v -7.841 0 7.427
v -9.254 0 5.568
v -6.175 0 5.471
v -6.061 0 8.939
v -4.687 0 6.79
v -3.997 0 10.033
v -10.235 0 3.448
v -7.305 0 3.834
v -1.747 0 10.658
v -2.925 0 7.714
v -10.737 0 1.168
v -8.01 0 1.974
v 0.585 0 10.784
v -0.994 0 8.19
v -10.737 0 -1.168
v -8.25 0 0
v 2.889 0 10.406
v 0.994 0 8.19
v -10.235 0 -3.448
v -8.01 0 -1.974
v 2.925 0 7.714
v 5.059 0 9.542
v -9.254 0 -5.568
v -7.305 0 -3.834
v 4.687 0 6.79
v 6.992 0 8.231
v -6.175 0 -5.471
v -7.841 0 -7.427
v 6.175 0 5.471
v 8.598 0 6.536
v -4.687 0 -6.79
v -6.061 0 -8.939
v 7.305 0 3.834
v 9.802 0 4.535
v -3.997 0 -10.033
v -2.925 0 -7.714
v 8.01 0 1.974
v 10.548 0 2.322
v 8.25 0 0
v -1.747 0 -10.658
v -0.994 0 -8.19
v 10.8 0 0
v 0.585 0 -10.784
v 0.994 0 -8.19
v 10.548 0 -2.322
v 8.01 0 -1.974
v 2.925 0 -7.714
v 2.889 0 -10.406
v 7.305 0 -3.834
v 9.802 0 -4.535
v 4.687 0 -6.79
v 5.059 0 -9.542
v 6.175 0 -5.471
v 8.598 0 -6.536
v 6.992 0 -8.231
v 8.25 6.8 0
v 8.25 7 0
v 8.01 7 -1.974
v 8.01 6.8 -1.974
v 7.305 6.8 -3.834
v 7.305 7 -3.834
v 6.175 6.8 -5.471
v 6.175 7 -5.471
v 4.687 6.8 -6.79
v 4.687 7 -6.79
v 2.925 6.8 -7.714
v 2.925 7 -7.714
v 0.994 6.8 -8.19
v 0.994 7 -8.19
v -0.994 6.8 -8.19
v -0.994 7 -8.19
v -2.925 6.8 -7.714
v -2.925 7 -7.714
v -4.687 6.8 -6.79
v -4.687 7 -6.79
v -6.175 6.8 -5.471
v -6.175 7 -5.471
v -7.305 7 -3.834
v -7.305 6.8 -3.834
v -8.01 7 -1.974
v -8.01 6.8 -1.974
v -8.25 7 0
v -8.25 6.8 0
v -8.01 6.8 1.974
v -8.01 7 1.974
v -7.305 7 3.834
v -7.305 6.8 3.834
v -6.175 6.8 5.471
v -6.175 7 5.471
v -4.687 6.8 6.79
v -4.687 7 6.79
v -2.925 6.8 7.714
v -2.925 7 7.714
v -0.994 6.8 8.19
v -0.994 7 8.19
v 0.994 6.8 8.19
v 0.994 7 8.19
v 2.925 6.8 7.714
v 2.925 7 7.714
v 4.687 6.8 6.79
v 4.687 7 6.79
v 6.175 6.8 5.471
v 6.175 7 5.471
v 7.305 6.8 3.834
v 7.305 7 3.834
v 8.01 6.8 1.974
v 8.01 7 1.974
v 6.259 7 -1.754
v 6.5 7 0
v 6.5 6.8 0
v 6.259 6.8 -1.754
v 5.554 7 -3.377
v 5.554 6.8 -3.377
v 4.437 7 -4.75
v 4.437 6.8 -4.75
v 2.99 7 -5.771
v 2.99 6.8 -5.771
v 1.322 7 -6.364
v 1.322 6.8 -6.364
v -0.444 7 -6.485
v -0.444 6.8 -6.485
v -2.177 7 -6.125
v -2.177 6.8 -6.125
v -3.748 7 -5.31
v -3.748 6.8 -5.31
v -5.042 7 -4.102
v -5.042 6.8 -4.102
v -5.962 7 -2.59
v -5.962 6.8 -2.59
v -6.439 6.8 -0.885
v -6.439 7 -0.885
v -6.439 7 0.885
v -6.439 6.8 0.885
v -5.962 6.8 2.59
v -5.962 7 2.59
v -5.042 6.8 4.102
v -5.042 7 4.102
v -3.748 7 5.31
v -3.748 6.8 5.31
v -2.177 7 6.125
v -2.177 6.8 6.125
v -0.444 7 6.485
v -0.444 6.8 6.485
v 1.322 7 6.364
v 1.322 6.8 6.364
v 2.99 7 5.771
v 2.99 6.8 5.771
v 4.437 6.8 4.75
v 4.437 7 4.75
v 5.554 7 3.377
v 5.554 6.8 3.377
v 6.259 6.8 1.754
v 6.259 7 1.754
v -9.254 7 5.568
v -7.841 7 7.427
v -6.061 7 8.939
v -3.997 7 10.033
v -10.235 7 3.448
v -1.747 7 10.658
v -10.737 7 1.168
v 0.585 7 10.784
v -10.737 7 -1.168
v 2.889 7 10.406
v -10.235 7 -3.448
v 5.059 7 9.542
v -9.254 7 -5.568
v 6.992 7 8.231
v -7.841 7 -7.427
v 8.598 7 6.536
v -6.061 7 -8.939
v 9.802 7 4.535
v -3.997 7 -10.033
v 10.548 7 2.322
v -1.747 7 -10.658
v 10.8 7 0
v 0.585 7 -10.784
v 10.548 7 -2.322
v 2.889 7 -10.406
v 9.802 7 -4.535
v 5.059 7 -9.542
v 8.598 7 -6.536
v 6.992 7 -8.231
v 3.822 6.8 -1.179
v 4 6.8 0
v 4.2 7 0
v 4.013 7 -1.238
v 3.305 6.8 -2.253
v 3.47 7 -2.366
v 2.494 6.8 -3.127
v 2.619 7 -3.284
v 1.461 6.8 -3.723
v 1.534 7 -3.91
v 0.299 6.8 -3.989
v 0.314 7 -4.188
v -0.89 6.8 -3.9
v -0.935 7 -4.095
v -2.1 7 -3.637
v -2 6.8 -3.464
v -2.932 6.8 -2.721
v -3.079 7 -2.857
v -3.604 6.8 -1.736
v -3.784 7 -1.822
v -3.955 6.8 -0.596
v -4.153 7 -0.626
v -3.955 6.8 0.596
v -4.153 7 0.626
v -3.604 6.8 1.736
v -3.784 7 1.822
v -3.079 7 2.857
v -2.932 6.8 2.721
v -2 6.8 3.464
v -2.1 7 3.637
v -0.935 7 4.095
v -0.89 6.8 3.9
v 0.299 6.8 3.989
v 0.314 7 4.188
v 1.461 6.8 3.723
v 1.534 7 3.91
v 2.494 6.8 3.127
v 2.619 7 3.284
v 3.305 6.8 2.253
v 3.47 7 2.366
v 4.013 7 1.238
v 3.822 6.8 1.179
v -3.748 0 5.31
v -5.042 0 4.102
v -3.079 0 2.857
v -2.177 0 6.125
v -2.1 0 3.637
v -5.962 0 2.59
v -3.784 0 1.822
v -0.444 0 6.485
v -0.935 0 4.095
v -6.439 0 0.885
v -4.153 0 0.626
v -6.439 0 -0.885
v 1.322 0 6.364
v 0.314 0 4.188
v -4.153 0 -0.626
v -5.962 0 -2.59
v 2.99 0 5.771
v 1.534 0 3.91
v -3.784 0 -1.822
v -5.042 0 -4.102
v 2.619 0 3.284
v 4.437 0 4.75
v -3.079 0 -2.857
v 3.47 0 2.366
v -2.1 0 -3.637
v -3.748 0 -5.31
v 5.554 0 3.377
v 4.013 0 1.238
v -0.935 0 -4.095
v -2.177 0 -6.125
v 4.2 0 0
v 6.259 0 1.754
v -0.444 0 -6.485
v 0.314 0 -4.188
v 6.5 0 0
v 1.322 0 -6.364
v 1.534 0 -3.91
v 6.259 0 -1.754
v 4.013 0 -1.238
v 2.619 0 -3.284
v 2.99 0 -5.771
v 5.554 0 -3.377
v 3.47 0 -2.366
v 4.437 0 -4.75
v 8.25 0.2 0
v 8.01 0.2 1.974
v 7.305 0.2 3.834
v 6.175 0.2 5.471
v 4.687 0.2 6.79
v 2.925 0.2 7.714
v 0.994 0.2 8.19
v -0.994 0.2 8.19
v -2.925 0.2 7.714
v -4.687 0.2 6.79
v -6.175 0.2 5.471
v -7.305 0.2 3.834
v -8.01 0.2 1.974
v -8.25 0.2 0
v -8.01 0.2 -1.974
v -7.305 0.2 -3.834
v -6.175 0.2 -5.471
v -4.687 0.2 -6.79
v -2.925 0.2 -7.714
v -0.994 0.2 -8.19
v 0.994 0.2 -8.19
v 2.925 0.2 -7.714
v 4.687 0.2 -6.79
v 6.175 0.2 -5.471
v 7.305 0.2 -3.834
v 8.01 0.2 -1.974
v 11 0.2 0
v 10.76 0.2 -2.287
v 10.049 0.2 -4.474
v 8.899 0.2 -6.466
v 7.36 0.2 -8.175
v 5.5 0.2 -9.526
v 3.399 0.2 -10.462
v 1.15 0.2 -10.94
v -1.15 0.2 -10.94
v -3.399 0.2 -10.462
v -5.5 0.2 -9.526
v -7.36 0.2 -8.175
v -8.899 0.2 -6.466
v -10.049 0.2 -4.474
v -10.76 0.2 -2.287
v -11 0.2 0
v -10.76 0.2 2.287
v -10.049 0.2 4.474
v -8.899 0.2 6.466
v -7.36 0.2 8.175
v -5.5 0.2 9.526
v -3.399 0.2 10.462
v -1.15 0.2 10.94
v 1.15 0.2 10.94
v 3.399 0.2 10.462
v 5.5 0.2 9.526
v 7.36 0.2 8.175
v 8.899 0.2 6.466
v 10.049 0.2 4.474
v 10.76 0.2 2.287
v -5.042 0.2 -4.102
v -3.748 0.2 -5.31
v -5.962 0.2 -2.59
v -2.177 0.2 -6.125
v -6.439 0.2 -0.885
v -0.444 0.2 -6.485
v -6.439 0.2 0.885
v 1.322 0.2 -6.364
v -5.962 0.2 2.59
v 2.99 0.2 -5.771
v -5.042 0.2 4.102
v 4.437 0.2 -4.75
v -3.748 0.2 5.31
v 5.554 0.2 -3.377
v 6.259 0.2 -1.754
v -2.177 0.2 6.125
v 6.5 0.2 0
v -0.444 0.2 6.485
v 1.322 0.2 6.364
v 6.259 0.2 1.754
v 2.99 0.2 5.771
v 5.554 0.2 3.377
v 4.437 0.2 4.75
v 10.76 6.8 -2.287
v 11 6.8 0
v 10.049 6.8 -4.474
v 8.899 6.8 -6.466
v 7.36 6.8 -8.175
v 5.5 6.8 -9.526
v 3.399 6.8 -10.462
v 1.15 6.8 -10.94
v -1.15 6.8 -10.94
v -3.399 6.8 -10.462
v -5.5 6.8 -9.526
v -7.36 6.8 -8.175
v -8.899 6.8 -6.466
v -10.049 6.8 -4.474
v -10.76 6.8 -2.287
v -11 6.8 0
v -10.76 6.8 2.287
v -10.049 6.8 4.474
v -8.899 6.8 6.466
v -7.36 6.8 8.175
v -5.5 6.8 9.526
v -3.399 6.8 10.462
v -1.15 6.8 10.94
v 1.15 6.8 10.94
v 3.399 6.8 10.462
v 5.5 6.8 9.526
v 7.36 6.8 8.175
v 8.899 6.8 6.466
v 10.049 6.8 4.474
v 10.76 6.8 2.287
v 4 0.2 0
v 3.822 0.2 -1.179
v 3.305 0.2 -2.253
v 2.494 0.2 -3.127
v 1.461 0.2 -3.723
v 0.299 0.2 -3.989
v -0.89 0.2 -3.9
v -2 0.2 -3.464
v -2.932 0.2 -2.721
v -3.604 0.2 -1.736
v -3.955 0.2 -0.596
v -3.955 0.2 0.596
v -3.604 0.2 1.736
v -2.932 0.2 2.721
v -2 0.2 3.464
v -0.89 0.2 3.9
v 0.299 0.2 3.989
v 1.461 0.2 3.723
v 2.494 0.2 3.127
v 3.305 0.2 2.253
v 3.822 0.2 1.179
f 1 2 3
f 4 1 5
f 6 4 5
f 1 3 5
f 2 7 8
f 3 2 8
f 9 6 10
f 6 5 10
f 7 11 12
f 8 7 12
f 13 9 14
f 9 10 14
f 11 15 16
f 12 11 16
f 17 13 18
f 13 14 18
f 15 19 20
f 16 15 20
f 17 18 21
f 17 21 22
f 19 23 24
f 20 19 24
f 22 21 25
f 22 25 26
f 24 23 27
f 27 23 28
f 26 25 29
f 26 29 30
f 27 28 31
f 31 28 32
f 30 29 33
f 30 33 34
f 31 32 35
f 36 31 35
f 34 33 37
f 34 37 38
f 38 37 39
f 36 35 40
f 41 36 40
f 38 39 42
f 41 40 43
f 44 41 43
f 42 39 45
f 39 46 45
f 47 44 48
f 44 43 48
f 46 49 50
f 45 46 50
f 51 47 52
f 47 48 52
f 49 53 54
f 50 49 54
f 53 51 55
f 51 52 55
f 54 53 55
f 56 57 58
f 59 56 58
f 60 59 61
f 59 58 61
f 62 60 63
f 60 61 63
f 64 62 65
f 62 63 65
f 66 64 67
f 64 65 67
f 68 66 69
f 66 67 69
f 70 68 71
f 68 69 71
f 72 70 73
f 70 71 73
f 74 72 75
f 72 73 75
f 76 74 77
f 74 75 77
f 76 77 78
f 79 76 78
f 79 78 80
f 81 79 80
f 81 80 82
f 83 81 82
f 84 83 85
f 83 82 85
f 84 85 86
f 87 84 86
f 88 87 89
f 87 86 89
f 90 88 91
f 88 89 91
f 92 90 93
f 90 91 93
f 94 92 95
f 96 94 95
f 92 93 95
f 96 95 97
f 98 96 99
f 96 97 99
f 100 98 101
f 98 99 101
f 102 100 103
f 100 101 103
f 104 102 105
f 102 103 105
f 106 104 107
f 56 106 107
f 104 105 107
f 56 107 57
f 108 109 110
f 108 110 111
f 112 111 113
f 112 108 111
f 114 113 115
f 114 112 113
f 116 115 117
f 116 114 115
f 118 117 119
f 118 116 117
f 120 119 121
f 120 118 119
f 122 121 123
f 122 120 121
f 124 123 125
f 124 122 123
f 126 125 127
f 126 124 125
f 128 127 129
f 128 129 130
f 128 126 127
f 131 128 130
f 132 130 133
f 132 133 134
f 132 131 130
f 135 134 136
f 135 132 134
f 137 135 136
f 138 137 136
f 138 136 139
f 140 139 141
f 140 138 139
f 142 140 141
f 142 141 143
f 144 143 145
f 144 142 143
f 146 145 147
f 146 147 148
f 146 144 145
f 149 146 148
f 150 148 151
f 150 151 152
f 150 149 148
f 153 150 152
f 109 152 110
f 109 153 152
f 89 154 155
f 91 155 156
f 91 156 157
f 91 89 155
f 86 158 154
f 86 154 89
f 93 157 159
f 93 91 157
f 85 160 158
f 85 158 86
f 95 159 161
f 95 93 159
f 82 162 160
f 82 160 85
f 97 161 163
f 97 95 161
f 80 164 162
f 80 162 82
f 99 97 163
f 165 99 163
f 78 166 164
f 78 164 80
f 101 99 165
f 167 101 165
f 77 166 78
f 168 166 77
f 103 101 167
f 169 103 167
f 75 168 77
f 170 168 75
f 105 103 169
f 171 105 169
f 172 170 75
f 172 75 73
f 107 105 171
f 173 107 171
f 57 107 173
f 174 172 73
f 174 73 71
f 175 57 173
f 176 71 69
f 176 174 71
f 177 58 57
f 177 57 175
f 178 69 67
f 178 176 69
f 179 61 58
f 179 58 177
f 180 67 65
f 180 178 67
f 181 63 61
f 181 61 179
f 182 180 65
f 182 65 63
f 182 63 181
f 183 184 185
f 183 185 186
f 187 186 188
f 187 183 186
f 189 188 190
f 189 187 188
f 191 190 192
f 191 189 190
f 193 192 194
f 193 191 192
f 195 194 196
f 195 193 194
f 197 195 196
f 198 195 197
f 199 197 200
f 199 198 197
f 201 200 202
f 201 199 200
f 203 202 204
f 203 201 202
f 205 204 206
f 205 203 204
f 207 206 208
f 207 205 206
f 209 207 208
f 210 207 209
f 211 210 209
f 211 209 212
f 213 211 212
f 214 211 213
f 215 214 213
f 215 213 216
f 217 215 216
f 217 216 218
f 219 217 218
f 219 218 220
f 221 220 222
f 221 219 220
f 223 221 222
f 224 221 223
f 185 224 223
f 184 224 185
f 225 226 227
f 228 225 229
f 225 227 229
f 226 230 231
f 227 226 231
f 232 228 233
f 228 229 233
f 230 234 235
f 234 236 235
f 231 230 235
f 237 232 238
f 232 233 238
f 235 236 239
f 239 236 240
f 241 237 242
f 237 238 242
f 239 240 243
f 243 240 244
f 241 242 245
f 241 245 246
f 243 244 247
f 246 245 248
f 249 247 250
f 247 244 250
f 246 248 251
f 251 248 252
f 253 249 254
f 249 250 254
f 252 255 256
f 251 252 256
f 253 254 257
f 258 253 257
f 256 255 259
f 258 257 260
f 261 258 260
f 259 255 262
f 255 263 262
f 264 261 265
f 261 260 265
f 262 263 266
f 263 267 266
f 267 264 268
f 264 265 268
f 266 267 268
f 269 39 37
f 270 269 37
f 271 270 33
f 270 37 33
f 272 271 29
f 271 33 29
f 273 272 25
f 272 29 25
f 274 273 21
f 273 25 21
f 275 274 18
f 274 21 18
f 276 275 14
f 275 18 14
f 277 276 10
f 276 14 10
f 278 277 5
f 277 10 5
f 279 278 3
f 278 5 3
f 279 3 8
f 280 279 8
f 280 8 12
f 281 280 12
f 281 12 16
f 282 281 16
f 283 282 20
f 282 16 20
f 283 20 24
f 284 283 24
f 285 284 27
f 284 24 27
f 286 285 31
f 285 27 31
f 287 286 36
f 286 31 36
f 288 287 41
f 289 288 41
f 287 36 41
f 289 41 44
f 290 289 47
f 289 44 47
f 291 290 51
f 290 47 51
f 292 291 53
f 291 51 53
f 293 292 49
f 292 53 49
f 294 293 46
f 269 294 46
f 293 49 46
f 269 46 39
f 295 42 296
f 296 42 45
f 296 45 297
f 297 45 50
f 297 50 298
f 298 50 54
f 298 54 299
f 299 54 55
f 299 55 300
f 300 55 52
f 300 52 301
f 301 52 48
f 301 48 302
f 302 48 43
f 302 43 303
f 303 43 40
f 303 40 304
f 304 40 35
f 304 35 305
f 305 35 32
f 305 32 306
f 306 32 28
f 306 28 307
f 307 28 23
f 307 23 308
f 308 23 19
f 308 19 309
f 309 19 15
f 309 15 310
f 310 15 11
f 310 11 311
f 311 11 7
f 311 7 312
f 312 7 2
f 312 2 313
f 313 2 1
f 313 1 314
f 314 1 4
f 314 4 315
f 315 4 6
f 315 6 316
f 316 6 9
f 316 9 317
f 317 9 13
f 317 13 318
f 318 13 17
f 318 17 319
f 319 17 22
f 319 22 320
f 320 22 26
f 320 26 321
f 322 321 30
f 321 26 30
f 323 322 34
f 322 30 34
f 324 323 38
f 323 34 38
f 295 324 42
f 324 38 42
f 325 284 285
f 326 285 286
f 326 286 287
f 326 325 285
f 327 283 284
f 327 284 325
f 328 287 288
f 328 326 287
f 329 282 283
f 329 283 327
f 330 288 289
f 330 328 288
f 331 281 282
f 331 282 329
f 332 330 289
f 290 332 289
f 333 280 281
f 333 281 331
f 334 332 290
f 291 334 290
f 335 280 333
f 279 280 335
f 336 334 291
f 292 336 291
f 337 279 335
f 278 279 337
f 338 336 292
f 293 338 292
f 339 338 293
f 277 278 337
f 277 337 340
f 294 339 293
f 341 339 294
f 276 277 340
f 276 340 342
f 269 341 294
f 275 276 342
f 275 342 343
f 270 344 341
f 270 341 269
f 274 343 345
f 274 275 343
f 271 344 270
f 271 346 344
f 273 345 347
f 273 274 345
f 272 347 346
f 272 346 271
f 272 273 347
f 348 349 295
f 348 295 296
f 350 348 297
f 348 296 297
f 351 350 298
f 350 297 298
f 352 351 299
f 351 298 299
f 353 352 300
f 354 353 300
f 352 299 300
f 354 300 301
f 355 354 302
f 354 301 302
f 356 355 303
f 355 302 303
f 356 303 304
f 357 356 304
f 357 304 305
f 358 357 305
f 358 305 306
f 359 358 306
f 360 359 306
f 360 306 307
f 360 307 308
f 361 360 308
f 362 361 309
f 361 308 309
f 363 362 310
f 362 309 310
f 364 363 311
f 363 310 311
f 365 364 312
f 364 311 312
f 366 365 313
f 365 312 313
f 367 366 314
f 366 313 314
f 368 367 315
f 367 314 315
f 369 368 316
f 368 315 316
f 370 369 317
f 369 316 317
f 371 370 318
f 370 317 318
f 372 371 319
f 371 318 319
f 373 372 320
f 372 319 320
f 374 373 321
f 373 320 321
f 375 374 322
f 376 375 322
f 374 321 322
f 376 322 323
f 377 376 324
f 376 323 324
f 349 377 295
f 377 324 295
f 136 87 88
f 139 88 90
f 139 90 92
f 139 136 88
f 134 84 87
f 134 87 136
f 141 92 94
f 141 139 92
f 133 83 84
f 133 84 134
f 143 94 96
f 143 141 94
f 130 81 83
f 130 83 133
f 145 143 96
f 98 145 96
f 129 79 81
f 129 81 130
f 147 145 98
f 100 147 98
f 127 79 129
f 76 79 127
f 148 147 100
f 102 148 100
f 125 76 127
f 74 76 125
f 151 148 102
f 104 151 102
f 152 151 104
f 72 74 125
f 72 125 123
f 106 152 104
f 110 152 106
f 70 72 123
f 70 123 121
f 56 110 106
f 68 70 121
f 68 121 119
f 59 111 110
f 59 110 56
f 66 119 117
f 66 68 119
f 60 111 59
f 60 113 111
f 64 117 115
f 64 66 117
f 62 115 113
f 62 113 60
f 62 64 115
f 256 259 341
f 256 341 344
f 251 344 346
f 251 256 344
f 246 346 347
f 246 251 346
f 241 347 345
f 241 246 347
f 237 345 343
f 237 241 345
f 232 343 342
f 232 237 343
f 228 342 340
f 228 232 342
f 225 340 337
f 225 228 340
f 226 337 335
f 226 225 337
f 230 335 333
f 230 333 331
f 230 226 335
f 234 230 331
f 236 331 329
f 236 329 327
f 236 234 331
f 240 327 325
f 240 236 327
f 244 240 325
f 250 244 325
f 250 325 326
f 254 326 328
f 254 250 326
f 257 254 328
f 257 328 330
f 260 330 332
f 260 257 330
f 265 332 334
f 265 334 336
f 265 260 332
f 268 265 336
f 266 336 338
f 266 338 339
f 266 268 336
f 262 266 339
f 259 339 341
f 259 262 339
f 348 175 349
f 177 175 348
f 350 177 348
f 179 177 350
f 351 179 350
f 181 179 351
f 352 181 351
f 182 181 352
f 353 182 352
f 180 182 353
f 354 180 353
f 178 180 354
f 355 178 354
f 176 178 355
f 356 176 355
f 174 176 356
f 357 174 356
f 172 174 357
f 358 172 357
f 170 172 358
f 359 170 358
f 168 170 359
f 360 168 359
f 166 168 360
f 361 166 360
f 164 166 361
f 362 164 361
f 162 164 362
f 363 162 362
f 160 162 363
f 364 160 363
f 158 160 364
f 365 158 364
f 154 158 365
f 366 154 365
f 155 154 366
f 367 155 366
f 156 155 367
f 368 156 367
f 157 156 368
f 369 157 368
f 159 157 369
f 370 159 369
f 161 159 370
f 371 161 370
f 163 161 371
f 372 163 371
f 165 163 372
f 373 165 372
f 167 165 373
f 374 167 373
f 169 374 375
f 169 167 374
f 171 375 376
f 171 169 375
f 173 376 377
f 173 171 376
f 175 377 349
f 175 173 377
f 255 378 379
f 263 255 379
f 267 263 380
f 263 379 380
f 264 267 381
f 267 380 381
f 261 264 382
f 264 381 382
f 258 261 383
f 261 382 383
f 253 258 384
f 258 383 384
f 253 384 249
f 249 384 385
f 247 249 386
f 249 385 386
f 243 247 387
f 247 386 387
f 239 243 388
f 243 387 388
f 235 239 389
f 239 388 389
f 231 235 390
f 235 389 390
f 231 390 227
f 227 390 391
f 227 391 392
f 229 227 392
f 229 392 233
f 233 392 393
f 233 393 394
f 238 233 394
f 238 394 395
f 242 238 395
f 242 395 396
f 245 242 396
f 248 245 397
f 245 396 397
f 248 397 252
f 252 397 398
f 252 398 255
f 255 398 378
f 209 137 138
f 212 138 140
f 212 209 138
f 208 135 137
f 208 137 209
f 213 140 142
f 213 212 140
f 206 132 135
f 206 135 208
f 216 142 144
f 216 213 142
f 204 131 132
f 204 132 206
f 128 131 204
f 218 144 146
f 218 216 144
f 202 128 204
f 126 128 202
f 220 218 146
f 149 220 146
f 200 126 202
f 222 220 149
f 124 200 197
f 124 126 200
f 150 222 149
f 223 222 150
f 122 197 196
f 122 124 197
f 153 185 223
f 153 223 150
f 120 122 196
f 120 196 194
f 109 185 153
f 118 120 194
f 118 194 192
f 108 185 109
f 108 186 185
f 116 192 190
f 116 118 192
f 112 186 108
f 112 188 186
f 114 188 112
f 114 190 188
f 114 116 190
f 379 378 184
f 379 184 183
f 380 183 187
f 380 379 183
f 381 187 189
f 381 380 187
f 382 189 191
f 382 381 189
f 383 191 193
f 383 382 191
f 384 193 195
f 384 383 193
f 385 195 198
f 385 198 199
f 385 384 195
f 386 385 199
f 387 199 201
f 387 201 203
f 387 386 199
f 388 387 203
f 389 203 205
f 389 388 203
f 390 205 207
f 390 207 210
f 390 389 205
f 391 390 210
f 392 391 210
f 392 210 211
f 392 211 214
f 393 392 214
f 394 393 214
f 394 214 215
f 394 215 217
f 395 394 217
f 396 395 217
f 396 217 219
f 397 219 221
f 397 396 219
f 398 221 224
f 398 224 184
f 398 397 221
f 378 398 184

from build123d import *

# Parameters (mm, degrees)
SKETCH1_R           = 11
SKETCH1_R_2         = 4
BOSS_EXTRUDE1_DEPTH = 7
SKETCH2_R           = 8.25
SKETCH2_R_2         = 6.5
CUT_EXTRUDE1_DEPTH  = 0.2
SKETCH3_R           = 8.25
SKETCH3_R_2         = 6.5
CUT_EXTRUDE2_DEPTH  = 0.2
CHAMFER1_SIZE       = 0.2


with BuildPart() as part:
    # Sketch1 → Boss-Extrude1 (new body)
    with BuildSketch(Plane(origin=(0, 0, 0), x_dir=(1, 0, 0), z_dir=(0, 1, 0))):
        Circle(SKETCH1_R)
        Circle(SKETCH1_R_2, mode=Mode.SUBTRACT)
    extrude(amount=BOSS_EXTRUDE1_DEPTH)

    # Sketch2 → Cut-Extrude1 (cut)
    with BuildSketch(Plane(origin=(0, 7, 0), x_dir=(1, 0, 0), z_dir=(0, 1, 0))):
        Circle(SKETCH2_R)
        Circle(SKETCH2_R_2, mode=Mode.SUBTRACT)
    extrude(amount=-CUT_EXTRUDE1_DEPTH, mode=Mode.SUBTRACT)

    # Sketch3 → Cut-Extrude2 (cut)
    with BuildSketch(Plane.XZ):
        Circle(SKETCH3_R)
        Circle(SKETCH3_R_2, mode=Mode.SUBTRACT)
    extrude(amount=-CUT_EXTRUDE2_DEPTH, mode=Mode.SUBTRACT)

    # Chamfer1
    chamfer1_edges = [part.edges().sort_by_distance(p)[0] for p in [
        (-11, 0, 0),
        (-11, 7, 0),
        (-4, 0, 0),
        (-4, 7, 0),
    ]]
    chamfer(chamfer1_edges, length=CHAMFER1_SIZE)


solid = part.part
